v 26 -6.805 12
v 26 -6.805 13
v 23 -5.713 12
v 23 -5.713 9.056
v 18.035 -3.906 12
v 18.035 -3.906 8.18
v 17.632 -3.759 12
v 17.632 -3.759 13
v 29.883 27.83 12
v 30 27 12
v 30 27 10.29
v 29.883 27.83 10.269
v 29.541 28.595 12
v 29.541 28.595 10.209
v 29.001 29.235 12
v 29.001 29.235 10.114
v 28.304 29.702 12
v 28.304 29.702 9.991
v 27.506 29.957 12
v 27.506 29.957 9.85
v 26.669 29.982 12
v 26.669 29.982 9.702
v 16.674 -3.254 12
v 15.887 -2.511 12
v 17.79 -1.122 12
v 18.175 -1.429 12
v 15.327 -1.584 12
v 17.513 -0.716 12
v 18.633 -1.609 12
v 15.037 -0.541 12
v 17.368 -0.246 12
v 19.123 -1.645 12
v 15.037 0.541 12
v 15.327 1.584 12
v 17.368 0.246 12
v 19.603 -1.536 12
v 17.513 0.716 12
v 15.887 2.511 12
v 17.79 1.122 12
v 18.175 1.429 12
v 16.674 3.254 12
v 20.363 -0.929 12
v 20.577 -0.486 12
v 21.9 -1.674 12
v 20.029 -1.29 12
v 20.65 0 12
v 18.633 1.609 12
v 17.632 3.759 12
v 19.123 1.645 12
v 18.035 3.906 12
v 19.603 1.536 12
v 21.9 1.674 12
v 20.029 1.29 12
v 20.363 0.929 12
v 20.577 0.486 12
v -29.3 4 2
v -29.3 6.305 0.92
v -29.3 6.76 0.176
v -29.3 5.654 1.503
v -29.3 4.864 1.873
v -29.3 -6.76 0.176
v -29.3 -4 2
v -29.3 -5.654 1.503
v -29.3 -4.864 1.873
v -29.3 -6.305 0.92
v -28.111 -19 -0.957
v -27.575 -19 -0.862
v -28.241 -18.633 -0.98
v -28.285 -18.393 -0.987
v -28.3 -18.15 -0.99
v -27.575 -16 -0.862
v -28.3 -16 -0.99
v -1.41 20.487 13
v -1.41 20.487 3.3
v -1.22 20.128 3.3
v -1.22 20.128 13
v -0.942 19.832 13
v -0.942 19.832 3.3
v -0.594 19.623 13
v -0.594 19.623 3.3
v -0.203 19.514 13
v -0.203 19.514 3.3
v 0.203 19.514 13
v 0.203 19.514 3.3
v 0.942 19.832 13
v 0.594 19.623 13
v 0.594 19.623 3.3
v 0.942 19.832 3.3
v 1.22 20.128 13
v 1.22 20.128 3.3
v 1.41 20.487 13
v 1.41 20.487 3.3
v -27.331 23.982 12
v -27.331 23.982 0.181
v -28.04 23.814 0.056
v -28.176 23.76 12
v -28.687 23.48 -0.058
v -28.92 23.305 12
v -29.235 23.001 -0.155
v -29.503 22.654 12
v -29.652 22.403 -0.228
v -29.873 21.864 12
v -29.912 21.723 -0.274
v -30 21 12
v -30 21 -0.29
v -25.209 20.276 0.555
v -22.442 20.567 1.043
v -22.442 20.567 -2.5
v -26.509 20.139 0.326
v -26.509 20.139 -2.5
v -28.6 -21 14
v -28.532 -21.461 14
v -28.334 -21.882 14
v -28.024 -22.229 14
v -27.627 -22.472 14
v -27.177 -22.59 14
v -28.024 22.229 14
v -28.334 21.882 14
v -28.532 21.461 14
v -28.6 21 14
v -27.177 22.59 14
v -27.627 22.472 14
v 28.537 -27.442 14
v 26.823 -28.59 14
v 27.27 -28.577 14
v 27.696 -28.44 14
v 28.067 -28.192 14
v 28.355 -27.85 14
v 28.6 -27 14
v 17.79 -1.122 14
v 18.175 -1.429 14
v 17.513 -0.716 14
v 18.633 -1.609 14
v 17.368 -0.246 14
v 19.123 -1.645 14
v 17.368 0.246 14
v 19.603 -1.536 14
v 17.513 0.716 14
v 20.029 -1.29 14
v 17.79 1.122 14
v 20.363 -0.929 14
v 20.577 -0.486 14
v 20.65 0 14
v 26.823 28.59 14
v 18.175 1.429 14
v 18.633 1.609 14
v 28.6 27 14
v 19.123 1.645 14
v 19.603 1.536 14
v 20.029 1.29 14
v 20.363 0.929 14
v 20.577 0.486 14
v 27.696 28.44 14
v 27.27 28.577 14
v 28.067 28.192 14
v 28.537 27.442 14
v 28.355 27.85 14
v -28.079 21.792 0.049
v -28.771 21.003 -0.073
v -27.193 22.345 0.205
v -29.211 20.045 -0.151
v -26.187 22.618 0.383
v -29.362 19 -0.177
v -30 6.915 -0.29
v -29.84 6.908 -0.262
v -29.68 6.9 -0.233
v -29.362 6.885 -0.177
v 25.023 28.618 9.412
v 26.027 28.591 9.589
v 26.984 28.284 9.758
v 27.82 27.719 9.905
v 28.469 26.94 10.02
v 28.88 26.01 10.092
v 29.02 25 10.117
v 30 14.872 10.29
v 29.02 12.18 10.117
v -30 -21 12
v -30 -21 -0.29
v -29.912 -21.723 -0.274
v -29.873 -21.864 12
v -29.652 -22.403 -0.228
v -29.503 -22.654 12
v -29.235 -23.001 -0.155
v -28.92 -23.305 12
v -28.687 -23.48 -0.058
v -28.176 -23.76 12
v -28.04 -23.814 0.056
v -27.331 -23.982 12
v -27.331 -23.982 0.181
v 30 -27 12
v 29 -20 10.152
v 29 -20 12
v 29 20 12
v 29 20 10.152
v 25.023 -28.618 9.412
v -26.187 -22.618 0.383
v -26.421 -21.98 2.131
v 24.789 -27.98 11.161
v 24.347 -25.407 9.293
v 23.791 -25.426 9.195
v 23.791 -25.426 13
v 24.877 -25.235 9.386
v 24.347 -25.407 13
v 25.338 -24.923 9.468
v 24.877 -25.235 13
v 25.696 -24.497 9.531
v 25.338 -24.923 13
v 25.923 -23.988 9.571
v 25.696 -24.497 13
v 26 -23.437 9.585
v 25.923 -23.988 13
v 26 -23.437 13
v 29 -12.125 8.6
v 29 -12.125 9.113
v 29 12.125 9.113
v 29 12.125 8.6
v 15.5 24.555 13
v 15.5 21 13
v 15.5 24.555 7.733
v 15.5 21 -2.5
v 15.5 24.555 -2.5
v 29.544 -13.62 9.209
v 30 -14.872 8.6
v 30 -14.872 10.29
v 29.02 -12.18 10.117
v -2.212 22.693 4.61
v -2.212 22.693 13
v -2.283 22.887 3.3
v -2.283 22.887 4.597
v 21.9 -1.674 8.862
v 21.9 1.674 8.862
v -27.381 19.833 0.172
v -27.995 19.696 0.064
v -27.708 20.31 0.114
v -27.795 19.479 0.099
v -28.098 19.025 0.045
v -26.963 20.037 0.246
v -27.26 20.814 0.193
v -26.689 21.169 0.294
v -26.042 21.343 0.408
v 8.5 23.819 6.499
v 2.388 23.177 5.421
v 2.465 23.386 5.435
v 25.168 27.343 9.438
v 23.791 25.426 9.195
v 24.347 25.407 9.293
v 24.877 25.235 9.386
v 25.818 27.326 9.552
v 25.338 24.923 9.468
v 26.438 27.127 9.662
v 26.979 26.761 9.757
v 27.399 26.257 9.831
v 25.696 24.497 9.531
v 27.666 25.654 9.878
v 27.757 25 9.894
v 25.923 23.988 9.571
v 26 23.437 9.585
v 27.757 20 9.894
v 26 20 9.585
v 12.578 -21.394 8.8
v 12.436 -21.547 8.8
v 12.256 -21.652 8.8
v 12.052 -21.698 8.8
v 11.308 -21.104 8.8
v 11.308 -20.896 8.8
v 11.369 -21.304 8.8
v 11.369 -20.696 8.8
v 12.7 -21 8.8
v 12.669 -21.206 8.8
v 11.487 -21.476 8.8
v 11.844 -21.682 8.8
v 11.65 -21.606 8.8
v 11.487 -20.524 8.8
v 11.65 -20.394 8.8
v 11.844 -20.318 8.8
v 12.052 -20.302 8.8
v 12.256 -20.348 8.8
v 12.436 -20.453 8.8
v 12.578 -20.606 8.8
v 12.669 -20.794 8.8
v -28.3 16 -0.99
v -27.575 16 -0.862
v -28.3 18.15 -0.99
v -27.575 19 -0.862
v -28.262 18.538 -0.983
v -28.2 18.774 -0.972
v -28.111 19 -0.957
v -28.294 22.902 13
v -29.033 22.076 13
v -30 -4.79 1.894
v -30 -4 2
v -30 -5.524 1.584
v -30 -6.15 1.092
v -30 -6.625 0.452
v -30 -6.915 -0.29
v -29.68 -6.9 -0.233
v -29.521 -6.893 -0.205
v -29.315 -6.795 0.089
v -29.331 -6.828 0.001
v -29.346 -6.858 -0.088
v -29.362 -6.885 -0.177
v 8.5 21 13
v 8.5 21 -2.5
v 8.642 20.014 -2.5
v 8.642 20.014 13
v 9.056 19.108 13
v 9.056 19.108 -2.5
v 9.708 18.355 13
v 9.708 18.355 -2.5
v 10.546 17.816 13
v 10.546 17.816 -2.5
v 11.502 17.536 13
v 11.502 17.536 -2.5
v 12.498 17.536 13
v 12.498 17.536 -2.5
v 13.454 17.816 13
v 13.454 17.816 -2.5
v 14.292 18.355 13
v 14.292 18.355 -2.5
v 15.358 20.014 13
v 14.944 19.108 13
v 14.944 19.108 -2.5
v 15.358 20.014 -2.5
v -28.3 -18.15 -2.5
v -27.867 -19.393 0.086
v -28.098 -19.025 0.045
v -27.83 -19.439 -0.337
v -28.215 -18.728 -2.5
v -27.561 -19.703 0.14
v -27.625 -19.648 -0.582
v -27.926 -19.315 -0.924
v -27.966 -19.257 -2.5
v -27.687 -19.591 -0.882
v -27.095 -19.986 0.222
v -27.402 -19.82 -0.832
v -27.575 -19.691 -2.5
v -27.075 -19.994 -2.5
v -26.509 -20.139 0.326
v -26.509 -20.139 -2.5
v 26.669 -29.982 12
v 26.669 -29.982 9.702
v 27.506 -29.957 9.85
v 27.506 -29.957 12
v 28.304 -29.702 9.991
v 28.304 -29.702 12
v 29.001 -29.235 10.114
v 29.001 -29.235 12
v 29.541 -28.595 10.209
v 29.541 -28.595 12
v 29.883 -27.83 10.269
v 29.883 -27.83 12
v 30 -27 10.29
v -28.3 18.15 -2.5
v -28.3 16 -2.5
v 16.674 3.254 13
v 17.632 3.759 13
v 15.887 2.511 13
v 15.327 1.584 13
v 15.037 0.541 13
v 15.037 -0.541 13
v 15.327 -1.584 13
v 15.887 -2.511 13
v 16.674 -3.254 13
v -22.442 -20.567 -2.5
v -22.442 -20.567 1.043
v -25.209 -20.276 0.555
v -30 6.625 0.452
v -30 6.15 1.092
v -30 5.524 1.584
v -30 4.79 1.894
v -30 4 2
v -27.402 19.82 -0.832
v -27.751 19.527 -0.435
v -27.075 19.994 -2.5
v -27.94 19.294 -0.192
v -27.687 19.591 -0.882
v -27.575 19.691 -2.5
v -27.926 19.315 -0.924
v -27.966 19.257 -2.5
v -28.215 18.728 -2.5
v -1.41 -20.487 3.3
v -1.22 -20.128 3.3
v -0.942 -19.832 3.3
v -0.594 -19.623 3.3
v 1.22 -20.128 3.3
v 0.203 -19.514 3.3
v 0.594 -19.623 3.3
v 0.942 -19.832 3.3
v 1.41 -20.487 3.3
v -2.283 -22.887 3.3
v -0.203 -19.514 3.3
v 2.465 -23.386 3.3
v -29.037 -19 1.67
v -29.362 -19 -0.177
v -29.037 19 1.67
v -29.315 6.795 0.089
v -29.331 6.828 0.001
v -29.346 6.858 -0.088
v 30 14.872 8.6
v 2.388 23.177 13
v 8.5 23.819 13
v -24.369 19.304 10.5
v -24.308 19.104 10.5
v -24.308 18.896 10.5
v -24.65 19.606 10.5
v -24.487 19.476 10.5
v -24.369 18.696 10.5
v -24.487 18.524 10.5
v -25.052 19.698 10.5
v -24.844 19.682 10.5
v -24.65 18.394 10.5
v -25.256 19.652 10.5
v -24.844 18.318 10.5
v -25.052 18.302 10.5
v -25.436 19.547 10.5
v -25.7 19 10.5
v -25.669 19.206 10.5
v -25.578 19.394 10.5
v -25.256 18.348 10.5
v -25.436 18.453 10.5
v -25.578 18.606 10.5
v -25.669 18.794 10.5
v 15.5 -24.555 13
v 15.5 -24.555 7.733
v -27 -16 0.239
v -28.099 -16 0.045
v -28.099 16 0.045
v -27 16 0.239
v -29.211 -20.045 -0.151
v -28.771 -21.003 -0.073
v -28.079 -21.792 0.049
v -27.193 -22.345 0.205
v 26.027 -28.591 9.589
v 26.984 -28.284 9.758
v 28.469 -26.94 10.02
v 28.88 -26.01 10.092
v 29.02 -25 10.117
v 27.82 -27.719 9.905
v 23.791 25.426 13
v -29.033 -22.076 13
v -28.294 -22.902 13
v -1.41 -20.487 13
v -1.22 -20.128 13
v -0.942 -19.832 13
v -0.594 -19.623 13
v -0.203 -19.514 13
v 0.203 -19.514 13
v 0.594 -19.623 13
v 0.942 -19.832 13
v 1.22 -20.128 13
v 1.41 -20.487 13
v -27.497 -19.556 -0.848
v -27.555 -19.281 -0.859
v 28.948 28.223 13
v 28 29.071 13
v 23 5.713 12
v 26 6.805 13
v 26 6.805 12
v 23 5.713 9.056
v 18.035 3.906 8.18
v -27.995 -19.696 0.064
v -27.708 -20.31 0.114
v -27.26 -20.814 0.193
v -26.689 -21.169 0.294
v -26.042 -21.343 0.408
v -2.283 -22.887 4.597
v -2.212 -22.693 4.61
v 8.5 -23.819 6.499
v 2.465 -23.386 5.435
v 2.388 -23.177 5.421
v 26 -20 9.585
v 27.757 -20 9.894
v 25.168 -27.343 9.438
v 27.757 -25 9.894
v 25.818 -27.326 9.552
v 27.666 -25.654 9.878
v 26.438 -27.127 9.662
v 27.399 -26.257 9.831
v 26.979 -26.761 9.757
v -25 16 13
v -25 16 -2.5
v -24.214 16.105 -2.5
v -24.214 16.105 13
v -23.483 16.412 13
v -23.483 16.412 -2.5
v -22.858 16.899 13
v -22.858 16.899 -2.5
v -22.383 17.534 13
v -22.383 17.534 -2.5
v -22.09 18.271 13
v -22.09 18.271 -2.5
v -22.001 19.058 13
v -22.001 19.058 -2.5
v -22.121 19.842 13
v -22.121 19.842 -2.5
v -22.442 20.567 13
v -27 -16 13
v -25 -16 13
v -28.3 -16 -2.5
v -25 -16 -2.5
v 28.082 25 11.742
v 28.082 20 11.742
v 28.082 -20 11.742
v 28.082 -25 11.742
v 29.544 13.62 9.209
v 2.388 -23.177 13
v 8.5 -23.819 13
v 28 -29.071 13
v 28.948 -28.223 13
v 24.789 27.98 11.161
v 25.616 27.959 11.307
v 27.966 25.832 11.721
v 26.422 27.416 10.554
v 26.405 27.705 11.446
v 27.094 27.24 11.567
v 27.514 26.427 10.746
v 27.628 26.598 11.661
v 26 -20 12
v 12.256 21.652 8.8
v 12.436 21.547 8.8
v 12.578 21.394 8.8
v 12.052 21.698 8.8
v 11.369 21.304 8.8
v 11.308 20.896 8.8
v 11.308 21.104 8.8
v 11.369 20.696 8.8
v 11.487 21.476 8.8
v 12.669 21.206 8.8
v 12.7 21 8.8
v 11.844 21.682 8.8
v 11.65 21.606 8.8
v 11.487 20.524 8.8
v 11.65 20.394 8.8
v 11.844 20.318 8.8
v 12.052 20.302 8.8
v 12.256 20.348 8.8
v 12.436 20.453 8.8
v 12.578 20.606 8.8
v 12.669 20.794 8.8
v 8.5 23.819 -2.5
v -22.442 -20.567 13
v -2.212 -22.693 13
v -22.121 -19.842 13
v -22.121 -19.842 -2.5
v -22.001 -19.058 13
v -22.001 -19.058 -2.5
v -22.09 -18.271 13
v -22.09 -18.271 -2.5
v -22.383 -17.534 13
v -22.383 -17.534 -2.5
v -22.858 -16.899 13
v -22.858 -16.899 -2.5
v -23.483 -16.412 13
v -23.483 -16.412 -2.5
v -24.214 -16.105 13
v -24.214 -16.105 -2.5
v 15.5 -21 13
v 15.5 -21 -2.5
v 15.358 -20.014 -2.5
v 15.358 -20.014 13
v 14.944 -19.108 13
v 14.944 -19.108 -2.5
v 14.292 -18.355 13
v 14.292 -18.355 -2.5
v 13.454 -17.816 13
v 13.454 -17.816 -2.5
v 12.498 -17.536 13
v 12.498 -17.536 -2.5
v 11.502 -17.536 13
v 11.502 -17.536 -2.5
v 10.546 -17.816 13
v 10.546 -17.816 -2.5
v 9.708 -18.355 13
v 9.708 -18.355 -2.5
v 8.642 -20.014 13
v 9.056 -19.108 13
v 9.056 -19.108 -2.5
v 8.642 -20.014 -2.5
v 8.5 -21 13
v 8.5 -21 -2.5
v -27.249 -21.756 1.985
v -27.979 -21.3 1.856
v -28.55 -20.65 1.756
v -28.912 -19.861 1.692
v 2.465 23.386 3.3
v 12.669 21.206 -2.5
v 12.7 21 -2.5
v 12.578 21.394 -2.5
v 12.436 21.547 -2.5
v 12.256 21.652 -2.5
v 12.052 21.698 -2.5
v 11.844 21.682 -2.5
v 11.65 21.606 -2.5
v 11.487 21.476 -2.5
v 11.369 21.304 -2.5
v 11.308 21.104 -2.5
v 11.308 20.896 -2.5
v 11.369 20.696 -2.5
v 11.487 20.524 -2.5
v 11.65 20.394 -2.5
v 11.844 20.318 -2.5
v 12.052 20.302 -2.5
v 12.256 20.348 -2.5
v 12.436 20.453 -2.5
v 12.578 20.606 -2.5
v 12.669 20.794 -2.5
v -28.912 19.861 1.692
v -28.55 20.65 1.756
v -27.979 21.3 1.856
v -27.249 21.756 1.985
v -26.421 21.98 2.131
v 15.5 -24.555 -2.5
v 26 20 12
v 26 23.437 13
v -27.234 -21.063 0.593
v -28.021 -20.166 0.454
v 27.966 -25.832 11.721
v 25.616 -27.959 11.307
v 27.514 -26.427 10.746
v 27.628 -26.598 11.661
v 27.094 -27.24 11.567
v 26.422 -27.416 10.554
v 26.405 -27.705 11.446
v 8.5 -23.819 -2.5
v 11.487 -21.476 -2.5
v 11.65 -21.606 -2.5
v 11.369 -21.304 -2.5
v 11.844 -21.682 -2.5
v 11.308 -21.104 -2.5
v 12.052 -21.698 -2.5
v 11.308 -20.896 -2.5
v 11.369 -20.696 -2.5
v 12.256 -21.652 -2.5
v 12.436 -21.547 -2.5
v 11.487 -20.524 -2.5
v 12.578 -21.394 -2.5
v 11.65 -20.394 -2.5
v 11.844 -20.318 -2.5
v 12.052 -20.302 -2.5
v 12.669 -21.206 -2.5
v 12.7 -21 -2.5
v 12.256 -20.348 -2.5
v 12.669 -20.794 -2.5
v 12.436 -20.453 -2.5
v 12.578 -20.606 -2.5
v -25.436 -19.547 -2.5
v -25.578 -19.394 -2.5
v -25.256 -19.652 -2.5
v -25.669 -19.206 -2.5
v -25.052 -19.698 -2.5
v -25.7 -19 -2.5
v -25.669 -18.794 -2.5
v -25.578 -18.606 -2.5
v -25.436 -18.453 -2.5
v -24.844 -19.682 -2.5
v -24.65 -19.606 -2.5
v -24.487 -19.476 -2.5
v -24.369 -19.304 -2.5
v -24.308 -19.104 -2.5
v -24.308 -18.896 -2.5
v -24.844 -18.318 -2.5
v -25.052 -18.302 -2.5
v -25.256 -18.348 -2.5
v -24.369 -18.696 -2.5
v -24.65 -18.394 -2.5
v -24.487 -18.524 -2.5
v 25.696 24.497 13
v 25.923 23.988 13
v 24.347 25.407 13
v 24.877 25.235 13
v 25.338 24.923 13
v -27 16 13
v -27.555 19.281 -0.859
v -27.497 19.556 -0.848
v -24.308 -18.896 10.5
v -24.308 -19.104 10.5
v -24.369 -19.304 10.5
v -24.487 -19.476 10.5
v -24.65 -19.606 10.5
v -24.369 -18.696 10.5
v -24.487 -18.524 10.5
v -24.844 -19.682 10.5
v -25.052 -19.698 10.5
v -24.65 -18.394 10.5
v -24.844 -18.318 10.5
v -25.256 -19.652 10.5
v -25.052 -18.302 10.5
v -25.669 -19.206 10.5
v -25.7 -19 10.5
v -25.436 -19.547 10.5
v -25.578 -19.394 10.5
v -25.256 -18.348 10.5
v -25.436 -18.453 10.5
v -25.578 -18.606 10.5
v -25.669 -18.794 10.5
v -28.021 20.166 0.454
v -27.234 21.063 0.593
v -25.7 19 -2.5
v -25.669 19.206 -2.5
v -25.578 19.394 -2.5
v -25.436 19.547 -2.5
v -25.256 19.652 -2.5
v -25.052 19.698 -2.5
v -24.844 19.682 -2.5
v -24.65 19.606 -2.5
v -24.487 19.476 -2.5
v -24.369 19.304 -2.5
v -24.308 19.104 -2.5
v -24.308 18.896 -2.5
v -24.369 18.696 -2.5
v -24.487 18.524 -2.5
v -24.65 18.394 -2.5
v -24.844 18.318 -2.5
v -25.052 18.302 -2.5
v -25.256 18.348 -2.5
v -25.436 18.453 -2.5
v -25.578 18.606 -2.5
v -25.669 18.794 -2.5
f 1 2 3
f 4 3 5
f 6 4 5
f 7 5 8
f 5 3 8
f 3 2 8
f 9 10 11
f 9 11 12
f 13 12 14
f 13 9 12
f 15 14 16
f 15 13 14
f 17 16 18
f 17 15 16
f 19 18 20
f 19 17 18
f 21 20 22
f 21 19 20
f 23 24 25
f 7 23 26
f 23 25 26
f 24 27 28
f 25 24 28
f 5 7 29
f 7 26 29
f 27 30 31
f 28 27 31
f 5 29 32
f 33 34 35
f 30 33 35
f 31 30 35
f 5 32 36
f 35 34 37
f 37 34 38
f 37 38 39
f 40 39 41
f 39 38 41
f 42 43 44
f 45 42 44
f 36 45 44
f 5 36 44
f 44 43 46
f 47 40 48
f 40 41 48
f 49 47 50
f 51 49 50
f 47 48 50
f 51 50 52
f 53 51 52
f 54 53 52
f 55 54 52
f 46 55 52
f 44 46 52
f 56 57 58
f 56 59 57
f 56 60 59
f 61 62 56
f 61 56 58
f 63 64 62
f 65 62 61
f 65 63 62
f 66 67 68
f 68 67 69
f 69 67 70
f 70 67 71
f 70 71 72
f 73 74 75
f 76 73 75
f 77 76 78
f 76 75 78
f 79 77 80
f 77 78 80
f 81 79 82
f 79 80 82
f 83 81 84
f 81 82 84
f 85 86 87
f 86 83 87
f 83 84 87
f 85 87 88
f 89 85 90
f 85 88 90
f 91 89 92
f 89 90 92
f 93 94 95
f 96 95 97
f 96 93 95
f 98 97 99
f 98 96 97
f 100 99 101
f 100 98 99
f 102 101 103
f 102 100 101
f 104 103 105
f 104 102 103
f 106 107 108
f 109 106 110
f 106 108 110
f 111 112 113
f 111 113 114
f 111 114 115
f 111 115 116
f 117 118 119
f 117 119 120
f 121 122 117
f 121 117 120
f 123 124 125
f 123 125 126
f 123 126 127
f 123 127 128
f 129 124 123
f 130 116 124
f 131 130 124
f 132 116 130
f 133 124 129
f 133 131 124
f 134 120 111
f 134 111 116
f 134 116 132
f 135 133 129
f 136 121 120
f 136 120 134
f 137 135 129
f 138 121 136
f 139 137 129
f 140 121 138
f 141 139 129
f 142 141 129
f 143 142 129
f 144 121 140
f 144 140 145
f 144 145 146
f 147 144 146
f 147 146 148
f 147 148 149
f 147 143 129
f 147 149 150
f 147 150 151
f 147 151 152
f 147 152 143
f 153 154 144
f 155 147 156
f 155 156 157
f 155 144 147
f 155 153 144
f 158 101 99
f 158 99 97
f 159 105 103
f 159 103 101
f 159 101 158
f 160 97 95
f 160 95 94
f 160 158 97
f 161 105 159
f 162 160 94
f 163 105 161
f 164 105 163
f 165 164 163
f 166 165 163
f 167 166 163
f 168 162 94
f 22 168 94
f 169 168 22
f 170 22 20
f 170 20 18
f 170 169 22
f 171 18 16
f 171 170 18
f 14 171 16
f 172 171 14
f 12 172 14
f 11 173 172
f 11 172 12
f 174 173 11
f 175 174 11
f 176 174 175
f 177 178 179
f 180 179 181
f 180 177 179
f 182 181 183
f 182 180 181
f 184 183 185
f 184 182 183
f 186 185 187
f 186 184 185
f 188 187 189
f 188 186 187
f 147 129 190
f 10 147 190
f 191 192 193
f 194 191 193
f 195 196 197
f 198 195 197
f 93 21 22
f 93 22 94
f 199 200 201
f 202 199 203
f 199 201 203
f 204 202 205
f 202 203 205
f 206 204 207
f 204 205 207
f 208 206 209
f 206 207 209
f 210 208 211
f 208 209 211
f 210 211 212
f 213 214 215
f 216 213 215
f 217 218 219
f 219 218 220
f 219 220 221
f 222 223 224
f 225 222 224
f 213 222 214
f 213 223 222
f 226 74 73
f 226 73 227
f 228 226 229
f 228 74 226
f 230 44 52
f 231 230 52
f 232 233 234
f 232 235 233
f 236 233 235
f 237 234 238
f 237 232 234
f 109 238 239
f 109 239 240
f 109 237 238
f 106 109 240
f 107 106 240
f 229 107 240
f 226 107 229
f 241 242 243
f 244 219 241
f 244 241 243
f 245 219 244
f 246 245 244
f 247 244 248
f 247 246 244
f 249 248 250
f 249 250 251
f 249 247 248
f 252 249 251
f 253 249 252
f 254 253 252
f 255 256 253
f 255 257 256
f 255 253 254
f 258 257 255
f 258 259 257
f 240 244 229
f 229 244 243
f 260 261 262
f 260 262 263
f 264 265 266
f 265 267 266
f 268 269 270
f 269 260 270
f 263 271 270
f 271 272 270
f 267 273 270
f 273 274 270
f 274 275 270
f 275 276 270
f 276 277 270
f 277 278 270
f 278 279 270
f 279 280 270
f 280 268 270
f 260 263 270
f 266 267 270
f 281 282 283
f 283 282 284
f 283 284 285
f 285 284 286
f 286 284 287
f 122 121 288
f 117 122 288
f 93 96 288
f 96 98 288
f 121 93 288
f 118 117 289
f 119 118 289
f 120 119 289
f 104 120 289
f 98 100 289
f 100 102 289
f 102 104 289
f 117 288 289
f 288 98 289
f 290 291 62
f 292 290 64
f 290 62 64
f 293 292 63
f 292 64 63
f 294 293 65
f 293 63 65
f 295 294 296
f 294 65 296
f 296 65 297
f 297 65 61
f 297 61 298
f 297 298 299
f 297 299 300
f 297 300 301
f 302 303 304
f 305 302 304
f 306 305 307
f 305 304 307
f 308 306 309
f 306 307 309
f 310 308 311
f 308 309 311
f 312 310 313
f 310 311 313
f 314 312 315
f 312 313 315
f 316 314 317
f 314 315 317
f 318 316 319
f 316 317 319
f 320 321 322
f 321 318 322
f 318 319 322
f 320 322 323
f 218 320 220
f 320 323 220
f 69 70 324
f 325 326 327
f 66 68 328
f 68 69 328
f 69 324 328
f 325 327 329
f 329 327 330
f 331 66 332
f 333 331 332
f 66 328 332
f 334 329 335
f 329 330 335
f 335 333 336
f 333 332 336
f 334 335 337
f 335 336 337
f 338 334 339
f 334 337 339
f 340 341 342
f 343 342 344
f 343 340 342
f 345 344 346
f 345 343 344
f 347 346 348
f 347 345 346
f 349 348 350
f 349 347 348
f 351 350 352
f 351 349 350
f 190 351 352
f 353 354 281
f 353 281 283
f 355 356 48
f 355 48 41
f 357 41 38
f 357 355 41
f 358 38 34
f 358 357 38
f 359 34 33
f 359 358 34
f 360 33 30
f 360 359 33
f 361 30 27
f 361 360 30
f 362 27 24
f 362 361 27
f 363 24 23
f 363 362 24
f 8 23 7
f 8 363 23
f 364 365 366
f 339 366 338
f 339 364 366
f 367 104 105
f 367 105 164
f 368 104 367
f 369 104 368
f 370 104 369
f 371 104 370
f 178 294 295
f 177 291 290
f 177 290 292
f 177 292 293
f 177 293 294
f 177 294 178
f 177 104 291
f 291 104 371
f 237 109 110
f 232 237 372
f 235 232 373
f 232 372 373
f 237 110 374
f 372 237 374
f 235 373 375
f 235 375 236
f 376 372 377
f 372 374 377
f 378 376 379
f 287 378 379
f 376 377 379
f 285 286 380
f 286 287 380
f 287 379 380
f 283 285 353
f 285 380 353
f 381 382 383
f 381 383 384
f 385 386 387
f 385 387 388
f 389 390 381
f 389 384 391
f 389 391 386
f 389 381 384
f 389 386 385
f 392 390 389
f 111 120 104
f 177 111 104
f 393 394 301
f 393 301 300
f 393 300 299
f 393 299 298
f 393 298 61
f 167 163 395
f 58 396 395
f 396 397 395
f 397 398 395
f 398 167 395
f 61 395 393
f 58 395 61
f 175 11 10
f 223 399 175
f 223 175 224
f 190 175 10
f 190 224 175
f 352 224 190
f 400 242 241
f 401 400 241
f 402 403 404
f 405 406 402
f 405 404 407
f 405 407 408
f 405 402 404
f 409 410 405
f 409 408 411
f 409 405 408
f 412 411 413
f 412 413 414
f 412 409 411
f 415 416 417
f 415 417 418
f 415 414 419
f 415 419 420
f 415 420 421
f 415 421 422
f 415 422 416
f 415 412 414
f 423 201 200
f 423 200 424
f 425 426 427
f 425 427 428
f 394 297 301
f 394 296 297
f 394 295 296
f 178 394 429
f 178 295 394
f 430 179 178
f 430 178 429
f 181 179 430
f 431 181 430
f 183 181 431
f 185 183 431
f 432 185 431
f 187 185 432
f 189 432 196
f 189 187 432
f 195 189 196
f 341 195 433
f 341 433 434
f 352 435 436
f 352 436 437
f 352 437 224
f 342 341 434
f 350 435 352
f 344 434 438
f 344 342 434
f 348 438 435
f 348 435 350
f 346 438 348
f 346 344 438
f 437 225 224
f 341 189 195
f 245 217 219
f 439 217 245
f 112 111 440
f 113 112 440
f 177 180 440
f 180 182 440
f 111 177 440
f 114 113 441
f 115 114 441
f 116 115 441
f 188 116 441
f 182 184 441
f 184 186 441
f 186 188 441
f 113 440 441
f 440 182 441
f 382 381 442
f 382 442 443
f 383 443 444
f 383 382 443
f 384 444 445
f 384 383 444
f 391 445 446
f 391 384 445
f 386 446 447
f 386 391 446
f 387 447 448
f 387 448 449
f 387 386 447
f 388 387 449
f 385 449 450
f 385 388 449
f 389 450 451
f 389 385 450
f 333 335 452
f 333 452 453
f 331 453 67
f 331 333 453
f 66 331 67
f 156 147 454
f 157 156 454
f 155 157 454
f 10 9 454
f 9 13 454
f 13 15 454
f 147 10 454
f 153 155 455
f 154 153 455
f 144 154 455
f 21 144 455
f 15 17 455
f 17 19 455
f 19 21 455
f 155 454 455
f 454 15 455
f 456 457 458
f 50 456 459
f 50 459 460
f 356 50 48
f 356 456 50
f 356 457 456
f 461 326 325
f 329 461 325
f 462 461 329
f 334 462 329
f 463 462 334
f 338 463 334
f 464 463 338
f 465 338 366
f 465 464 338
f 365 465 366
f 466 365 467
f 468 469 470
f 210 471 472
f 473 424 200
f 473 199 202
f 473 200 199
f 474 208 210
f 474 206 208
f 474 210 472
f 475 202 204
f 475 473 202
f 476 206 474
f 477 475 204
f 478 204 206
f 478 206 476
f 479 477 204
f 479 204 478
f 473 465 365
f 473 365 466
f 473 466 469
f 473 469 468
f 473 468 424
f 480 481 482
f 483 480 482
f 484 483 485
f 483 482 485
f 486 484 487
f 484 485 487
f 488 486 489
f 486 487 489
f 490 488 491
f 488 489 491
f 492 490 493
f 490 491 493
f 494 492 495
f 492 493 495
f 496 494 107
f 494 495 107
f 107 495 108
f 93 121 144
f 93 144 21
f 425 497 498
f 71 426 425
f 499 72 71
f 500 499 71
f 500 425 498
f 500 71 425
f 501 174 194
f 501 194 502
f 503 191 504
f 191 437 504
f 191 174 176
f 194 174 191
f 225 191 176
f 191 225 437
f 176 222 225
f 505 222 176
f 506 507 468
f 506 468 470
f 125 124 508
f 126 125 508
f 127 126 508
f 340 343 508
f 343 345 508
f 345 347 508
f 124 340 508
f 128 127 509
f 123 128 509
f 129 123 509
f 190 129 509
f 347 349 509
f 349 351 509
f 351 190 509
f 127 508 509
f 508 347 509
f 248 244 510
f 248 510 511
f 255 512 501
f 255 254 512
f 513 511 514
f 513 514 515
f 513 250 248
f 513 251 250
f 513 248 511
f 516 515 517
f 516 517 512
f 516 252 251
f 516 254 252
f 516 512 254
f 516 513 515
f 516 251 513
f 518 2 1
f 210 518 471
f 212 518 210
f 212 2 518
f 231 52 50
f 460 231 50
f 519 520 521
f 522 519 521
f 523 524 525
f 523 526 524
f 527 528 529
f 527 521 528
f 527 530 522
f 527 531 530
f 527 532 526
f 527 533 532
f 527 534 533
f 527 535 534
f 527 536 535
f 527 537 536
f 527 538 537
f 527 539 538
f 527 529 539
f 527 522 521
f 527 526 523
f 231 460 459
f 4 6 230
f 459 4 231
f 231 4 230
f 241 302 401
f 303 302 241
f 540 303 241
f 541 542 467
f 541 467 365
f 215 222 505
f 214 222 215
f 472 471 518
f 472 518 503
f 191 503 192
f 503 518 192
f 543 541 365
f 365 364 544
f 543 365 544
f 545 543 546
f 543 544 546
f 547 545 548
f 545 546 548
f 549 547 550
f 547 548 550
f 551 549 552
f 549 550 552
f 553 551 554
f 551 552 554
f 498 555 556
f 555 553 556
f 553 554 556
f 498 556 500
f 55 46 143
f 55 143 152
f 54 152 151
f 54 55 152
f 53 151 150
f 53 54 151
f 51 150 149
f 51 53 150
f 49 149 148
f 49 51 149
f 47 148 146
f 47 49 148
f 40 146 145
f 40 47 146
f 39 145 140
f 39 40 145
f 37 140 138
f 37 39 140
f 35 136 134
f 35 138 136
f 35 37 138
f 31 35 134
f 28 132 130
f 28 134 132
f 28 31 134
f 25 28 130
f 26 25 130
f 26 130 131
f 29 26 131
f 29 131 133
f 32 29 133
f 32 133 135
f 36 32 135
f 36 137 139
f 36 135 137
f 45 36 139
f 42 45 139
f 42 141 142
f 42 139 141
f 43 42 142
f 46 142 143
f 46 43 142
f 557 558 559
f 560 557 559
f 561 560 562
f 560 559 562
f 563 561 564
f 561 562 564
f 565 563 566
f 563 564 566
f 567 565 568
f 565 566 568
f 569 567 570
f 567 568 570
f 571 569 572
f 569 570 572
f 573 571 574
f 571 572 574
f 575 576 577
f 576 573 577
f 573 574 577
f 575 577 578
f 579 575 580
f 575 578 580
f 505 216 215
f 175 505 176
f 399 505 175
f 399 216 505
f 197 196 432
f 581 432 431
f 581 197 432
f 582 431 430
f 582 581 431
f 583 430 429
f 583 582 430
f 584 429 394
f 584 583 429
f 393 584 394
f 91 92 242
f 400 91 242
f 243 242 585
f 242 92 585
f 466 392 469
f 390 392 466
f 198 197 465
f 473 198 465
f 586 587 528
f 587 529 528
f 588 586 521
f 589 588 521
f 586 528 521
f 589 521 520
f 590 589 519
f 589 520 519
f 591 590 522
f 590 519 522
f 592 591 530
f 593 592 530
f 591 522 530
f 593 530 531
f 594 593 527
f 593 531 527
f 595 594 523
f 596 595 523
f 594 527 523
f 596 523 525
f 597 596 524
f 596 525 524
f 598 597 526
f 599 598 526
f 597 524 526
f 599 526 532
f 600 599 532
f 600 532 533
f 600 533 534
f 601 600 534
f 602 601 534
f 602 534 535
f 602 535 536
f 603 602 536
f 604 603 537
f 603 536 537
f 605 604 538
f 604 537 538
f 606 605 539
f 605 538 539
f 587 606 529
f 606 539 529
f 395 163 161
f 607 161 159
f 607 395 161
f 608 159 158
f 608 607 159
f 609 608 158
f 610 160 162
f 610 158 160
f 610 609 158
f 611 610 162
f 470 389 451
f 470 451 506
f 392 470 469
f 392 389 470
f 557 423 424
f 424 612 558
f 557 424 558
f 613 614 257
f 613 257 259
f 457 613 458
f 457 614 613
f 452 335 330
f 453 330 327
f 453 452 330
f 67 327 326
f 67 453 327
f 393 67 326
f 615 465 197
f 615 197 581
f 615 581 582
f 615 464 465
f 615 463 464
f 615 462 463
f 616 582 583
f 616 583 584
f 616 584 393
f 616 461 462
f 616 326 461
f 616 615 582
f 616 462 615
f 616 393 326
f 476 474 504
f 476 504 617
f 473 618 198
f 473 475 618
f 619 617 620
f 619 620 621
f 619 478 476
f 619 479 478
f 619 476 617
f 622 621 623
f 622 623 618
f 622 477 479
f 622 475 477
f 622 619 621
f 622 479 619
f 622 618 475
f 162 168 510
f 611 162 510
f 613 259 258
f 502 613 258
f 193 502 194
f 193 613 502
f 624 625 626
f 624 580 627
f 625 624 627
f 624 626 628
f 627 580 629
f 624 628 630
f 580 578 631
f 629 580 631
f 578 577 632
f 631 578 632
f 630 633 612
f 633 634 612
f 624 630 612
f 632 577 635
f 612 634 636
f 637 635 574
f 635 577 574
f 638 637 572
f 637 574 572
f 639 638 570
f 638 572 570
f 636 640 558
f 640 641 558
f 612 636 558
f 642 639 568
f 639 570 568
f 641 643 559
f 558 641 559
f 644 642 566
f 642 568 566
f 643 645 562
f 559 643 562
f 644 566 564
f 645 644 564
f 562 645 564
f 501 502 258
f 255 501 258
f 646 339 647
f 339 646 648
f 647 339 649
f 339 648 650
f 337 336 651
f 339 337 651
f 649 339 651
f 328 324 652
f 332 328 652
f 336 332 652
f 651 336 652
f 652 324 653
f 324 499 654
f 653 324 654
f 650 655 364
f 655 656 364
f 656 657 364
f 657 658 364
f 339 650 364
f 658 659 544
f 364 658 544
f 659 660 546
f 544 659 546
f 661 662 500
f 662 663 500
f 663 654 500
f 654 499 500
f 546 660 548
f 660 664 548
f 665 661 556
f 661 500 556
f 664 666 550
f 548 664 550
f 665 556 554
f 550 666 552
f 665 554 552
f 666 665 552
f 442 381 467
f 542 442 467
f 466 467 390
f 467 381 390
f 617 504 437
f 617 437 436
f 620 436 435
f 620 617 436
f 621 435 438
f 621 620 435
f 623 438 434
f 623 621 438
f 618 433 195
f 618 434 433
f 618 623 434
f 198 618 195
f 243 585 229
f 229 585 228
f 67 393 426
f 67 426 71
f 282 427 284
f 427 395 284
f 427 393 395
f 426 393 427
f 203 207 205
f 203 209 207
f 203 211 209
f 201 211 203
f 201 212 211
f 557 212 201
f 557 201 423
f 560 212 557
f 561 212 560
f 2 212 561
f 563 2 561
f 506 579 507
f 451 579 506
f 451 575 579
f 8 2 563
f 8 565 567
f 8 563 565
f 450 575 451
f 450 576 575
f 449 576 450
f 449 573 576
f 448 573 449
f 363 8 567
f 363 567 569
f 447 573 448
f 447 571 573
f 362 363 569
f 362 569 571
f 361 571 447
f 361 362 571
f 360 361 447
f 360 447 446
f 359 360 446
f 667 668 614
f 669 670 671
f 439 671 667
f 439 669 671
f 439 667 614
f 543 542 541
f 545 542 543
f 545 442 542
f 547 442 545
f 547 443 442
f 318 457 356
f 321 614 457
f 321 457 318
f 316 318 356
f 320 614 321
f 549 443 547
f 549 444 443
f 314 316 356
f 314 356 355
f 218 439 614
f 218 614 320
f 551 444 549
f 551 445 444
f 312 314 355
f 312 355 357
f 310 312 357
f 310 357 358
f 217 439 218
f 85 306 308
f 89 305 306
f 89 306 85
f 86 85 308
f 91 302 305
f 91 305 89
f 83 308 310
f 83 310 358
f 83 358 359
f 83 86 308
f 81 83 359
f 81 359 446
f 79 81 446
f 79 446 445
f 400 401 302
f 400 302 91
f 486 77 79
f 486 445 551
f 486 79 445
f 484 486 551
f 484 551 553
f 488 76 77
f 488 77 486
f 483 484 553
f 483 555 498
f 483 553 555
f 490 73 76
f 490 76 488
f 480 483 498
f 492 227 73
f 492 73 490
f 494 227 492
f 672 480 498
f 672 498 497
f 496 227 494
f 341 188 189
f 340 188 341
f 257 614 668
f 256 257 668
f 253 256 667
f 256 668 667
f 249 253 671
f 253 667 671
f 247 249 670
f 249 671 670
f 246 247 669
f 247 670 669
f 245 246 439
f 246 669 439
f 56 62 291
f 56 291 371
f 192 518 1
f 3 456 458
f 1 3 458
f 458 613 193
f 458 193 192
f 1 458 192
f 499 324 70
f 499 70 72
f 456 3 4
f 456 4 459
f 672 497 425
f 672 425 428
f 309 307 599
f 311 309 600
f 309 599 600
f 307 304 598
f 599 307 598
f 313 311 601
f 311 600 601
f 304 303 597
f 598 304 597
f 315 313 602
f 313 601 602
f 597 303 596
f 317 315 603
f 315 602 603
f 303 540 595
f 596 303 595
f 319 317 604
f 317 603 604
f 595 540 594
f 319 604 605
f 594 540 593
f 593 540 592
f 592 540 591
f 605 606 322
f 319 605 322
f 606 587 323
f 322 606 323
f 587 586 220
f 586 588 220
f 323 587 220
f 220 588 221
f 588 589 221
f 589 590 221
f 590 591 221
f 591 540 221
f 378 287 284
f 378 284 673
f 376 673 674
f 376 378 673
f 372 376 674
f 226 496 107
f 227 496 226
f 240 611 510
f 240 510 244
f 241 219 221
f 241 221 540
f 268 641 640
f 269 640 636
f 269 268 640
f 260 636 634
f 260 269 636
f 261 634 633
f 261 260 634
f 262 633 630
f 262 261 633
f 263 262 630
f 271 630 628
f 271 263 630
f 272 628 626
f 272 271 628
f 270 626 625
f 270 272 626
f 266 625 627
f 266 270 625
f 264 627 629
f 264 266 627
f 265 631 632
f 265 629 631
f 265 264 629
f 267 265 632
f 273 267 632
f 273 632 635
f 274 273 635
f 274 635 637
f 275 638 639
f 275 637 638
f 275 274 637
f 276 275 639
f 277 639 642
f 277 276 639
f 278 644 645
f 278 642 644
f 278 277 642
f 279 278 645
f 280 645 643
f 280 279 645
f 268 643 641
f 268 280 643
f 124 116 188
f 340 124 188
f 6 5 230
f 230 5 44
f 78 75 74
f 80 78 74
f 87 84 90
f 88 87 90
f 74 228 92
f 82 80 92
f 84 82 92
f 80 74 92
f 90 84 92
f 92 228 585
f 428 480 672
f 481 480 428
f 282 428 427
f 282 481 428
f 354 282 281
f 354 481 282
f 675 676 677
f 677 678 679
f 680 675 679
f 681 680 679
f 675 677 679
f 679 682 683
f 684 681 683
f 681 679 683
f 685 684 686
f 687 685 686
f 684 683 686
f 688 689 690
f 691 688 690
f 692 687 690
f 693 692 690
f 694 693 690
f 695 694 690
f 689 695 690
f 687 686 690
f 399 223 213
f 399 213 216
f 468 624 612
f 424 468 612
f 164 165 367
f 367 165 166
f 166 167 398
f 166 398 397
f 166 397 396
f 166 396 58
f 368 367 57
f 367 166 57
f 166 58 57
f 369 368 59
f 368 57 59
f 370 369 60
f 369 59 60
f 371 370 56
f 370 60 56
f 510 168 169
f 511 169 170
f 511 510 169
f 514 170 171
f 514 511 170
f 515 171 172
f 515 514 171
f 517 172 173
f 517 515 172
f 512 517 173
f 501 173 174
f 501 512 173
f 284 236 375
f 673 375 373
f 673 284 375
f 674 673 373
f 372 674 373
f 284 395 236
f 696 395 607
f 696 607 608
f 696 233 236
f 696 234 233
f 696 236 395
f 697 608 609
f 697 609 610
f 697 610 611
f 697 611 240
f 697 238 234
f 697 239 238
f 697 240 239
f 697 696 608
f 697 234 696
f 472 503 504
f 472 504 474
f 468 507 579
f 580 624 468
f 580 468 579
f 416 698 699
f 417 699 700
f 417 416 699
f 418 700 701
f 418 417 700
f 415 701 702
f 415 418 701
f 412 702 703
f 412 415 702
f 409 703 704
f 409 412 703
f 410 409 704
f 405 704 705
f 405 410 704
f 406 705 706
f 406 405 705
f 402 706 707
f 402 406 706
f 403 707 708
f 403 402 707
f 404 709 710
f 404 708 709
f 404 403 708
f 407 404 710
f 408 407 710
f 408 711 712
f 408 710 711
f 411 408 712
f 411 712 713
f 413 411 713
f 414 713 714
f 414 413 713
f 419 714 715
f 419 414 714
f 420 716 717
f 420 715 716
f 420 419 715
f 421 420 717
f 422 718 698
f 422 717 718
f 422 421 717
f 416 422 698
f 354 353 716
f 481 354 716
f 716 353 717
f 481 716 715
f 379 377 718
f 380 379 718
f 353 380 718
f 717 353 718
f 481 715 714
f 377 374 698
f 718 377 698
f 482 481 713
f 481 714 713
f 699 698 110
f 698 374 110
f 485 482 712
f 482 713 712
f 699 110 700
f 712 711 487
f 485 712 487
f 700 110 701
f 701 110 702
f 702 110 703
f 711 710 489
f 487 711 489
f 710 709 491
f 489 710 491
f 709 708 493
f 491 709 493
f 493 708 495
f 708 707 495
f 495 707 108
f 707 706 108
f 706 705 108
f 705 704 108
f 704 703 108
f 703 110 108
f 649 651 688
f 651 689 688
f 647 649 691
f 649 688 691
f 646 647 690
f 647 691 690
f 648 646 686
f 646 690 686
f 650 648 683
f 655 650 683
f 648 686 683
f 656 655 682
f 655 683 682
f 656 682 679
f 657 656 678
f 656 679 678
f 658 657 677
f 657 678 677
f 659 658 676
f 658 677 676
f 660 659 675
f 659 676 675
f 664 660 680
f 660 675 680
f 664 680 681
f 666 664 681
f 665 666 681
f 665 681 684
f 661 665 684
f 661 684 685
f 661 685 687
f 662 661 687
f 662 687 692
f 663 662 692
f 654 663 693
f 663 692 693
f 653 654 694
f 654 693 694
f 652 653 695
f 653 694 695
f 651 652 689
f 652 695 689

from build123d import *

# Parameters (mm, degrees)
PAD008_DEPTH         = 14
PAD008_DEPTH_BACK    = 5
POCKET006_DEPTH      = 30.001
POCKET006_DEPTH_BACK = 30.001
POCKET032_DEPTH      = 13.2908094213
PAD015_DEPTH         = 16
SKETCH026_W          = 0.7
SKETCH026_H          = 12
SKETCH027_W          = 0.7
SKETCH027_H          = 14
POCKET033_DEPTH      = 14.501
SKETCH037_R          = 1.65
POCKET034_DEPTH      = 14.001
PAD016_DEPTH         = 3
SKETCH036_W          = 6
SKETCH036_H          = 40
POCKET035_DEPTH      = 14.501
POCKET036_DEPTH      = 0.701
PAD017_DEPTH         = 10


with BuildPart() as part:
    # Sketch020 → Pad008 (new body, two sides)
    with BuildSketch(Plane.XY) as pad008_sk:
        with BuildLine():
            Line((26.6687054218, 29.981651204), (-27.3312945782, 23.981651204))
            ThreePointArc((-27.3312945782, 23.981651204), (-29.2353840537, 23.0007643871), (-30, 21))
            Line((-30, 21), (-30, -21))
            ThreePointArc((-30, -21), (-29.2353840537, -23.0007643871), (-27.3312945782, -23.981651204))
            Line((-27.3312945782, -23.981651204), (26.6687054218, -29.981651204))
            ThreePointArc((26.6687054218, -29.981651204), (29.0007643871, -29.2353840537), (30, -27))
            Line((30, -27), (30, 27))
            ThreePointArc((30, 27), (29.0007643871, 29.2353840537), (26.6687054218, 29.981651204))
        make_face()
    extrude(amount=PAD008_DEPTH)
    extrude(pad008_sk.sketch, amount=-PAD008_DEPTH_BACK)

    # Sketch021 → Pocket006 (cut, two sides)
    with BuildSketch(Plane.XZ) as pocket006_sk:
        Polygon((31, -6), (-31, -6), (-31, -0.466136402), (31, 10.466136402), align=None)
    extrude(amount=-POCKET006_DEPTH, mode=Mode.SUBTRACT)
    extrude(pocket006_sk.sketch, amount=POCKET006_DEPTH_BACK, mode=Mode.SUBTRACT)

    # Sketch040 → Pocket032 (cut, through all)
    with BuildSketch(Plane.XY.offset(13)):
        with BuildLine():
            Line((-25.2090569265, 20.276010124), (23.7909430735, 25.426117652))
            ThreePointArc((26, 23.4370738613), (25.3382612127, 24.9233635123), (23.7909430735, 25.426117652))
            Line((26, 23.4370738613), (26, 6.8045027298))
            Line((26, 6.8045027298), (17.6319194267, 3.7587704831))
            ThreePointArc((17.6319194267, 3.7587704831), (15, 0), (17.6319194267, -3.7587704831))
            Line((26, -6.8045027298), (17.6319194267, -3.7587704831))
            Line((26, -6.8045027298), (26, -23.4370738613))
            ThreePointArc((23.7909430735, -25.426117652), (25.3382612127, -24.9233635123), (26, -23.4370738613))
            Line((23.7909430735, -25.426117652), (-25.2090569265, -20.276010124))
            ThreePointArc((-27, -18.2869663333), (-26.486289651, -19.625227546), (-25.2090569265, -20.276010124))
            Line((-27, -18.2869663333), (-27, 18.2869663333))
            ThreePointArc((-25.2090569265, 20.276010124), (-26.486289651, 19.625227546), (-27, 18.2869663333))
        make_face()
    extrude(amount=-POCKET032_DEPTH, mode=Mode.SUBTRACT)

    # Sketch063 → Pad015 (join)
    with BuildSketch(Plane.XY.offset(-2.5)):
        with BuildLine():
            Line((15.5, 21), (15.5, 24.5547044207))
            Line((15.5, 24.5547044207), (8.5, 23.8189747738))
            Line((8.5, 21), (8.5, 23.8189747738))
            ThreePointArc((8.5, 21), (12, 17.5), (15.5, 21))
        make_face()
        with BuildLine():
            Line((8.5, -23.8189747738), (15.5, -24.5547044207))
            Line((15.5, -24.5547044207), (15.5, -21))
            ThreePointArc((15.5, -21), (12, -17.5), (8.5, -21))
            Line((8.5, -23.8189747738), (8.5, -21))
        make_face()
        with BuildLine():
            ThreePointArc((-25, 16), (-22.3826908751, 17.5338168788), (-22.4416970255, 20.5668713701))
            Line((-22.4416970255, 20.5668713701), (-26.5090569265, 20.1393746182))
            ThreePointArc((-26.5090569265, 20.1393746182), (-27.786289651, 19.4885920402), (-28.3, 18.1503308274))
            Line((-28.3, 16), (-28.3, 18.1503308274))
            Line((-25, 16), (-28.3, 16))
        make_face()
        with BuildLine():
            ThreePointArc((-22.4416970255, -20.5668713701), (-22.3826908751, -17.5338168788), (-25, -16))
            Line((-28.3, -16), (-25, -16))
            Line((-28.3, -18.1503308274), (-28.3, -16))
            ThreePointArc((-28.3, -18.1503308274), (-27.786289651, -19.4885920402), (-26.5090569265, -20.1393746182))
            Line((-22.4416970255, -20.5668713701), (-26.5090569265, -20.1393746182))
        make_face()
    extrude(amount=PAD015_DEPTH)

    # Sketch026 → Groove (revolve, cut)
    with BuildSketch(Plane.XZ.offset(21)):
        with Locations((12.35, 2.8)):
            Rectangle(SKETCH026_W, SKETCH026_H)
    groove = revolve(axis=Axis((12, -21, 8.8), (0, 0, -1)), mode=Mode.SUBTRACT)

    # Sketch027 → Groove004 (revolve, cut)
    with BuildSketch(Plane.XZ.offset(19)):
        with Locations((-25.35, 3.5)):
            Rectangle(SKETCH027_W, SKETCH027_H)
    groove004 = revolve(axis=Axis((-25, -19, -17.5), (0, 0, 1)), mode=Mode.SUBTRACT)

    # Mirrored013: Groove, Groove004 across XZ
    add(groove.mirror(Plane.XZ), mode=Mode.SUBTRACT)
    add(groove004.mirror(Plane.XZ), mode=Mode.SUBTRACT)

    # Sketch057 → Pocket033 (cut, through all)
    with BuildSketch(Plane.XY.offset(12)):
        with BuildLine():
            Line((21.9, -1.6743157806), (21.9, 1.6743157806))
            Line((21.9, 1.6743157806), (15.9010990338, 5.1377828683))
            ThreePointArc((15.9010990338, 5.1377828683), (13, 0), (15.9010990338, -5.1377828683))
            Line((15.9010990338, -5.1377828683), (21.9, -1.6743157806))
        make_face()
    extrude(amount=-POCKET033_DEPTH, mode=Mode.SUBTRACT)

    # Sketch037 → Pocket034 (cut, through all)
    with BuildSketch(Plane.XY):
        with Locations((19, 0)):
            Circle(SKETCH037_R)
    extrude(amount=POCKET034_DEPTH, mode=Mode.SUBTRACT)

    # Sketch039 → Pad016 (join)
    with BuildSketch(Plane.XY.offset(8.6)):
        Polygon((28.9, -11.85), (28.9, 11.85), (30, 14.8722251614), (30, -14.8722251614), align=None)
    extrude(amount=PAD016_DEPTH)

    # SubtractivePipe: sweep along a path in Sketch020
    with BuildLine(Plane.XY) as subtractivepipe_path:
        Line((26.6687054218, 29.981651204), (-27.3312945782, 23.981651204))
        ThreePointArc((-27.3312945782, 23.981651204), (-29.2353840537, 23.0007643871), (-30, 21))
        Line((-30, 21), (-30, -21))
        ThreePointArc((-30, -21), (-29.2353840537, -23.0007643871), (-27.3312945782, -23.981651204))
        Line((-27.3312945782, -23.981651204), (26.6687054218, -29.981651204))
        ThreePointArc((26.6687054218, -29.981651204), (29.0007643871, -29.2353840537), (30, -27))
        Line((30, -27), (30, 27))
        ThreePointArc((30, 27), (29.0007643871, 29.2353840537), (26.6687054218, 29.981651204))
    # Sketch035 → SubtractivePipe (sweep, cut)
    with BuildSketch(Plane.XZ):
        Polygon((28.5995849236, 14), (30, 14), (30, 12), align=None)
    sweep(path=subtractivepipe_path.line, mode=Mode.SUBTRACT)

    # Sketch036 → Pocket035 (cut, through all)
    with BuildSketch(Plane.XY.offset(12)):
        with Locations((26, 0)):
            Rectangle(SKETCH036_W, SKETCH036_H)
    extrude(amount=-POCKET035_DEPTH, mode=Mode.SUBTRACT)

    # Sketch054 → Pocket036 (cut, through all)
    with BuildSketch(Plane.YZ.offset(-29.3)):
        with BuildLine():
            Line((-4, 2), (4, 2))
            ThreePointArc((7, -1), (6.1213203436, 1.1213203436), (4, 2))
            Line((7, -1), (7, -3))
            ThreePointArc((4, -6), (6.1213203436, -5.1213203436), (7, -3))
            Line((4, -6), (-4, -6))
            ThreePointArc((-7, -3), (-6.1213203436, -5.1213203436), (-4, -6))
            Line((-7, -3), (-7, -1))
            ThreePointArc((-4, 2), (-6.1213203436, 1.1213203436), (-7, -1))
        make_face()
    extrude(amount=-POCKET036_DEPTH, mode=Mode.SUBTRACT)

    # Sketch064 → Pad017 (join)
    with BuildSketch(Plane.XY.offset(3.3)):
        with BuildLine():
            Line((1.4095389312, 20.486969785), (2.4646015442, 23.3857304905))
            Line((2.4646015442, 23.3857304905), (-2.2829835631, 22.8867391884))
            Line((-1.4095389312, 20.486969785), (-2.2829835631, 22.8867391884))
            ThreePointArc((-1.4095389312, 20.486969785), (0, 19.5), (1.4095389312, 20.486969785))
        make_face()
    pad017 = extrude(amount=PAD017_DEPTH)

    # Mirrored014: Pad017 across XZ
    add(pad017.mirror(Plane.XZ))

    # SubtractivePipe002: sweep along a path in Sketch023
    with BuildLine(Plane(origin=(0, 0, 4), x_dir=(0.984807753, 0, 0.1736481777), z_dir=(-0.1736481777, 0, 0.984807753))) as subtractivepipe002_path:
        Line((-26.343872324, 21.9802268076), (25.656127676, 27.9802268076))
        ThreePointArc((25.656127676, 27.9802268076), (27.996043966, 27.2396000728), (29, 25))
        Line((29, 25), (29, -25))
        ThreePointArc((29, -25), (27.996043966, -27.2396000728), (25.656127676, -27.9802268076))
        Line((25.656127676, -27.9802268076), (-26.343872324, -21.9802268076))
        ThreePointArc((-26.343872324, -21.9802268076), (-28.2396000728, -20.996043966), (-29, -19))
        Line((-29, -19), (-29, 19))
        ThreePointArc((-29, 19), (-28.2396000728, 20.996043966), (-26.343872324, 21.9802268076))
    # Sketch025 → SubtractivePipe002 (sweep, cut)
    with BuildSketch(Plane.XZ):
        Polygon((28.0823303903, 11.7415342162), (27.5746170843, 8.8621489747), (29.5442325904, 9.20944533), align=None)
    sweep(path=subtractivepipe002_path.line, mode=Mode.SUBTRACT)


solid = part.part
